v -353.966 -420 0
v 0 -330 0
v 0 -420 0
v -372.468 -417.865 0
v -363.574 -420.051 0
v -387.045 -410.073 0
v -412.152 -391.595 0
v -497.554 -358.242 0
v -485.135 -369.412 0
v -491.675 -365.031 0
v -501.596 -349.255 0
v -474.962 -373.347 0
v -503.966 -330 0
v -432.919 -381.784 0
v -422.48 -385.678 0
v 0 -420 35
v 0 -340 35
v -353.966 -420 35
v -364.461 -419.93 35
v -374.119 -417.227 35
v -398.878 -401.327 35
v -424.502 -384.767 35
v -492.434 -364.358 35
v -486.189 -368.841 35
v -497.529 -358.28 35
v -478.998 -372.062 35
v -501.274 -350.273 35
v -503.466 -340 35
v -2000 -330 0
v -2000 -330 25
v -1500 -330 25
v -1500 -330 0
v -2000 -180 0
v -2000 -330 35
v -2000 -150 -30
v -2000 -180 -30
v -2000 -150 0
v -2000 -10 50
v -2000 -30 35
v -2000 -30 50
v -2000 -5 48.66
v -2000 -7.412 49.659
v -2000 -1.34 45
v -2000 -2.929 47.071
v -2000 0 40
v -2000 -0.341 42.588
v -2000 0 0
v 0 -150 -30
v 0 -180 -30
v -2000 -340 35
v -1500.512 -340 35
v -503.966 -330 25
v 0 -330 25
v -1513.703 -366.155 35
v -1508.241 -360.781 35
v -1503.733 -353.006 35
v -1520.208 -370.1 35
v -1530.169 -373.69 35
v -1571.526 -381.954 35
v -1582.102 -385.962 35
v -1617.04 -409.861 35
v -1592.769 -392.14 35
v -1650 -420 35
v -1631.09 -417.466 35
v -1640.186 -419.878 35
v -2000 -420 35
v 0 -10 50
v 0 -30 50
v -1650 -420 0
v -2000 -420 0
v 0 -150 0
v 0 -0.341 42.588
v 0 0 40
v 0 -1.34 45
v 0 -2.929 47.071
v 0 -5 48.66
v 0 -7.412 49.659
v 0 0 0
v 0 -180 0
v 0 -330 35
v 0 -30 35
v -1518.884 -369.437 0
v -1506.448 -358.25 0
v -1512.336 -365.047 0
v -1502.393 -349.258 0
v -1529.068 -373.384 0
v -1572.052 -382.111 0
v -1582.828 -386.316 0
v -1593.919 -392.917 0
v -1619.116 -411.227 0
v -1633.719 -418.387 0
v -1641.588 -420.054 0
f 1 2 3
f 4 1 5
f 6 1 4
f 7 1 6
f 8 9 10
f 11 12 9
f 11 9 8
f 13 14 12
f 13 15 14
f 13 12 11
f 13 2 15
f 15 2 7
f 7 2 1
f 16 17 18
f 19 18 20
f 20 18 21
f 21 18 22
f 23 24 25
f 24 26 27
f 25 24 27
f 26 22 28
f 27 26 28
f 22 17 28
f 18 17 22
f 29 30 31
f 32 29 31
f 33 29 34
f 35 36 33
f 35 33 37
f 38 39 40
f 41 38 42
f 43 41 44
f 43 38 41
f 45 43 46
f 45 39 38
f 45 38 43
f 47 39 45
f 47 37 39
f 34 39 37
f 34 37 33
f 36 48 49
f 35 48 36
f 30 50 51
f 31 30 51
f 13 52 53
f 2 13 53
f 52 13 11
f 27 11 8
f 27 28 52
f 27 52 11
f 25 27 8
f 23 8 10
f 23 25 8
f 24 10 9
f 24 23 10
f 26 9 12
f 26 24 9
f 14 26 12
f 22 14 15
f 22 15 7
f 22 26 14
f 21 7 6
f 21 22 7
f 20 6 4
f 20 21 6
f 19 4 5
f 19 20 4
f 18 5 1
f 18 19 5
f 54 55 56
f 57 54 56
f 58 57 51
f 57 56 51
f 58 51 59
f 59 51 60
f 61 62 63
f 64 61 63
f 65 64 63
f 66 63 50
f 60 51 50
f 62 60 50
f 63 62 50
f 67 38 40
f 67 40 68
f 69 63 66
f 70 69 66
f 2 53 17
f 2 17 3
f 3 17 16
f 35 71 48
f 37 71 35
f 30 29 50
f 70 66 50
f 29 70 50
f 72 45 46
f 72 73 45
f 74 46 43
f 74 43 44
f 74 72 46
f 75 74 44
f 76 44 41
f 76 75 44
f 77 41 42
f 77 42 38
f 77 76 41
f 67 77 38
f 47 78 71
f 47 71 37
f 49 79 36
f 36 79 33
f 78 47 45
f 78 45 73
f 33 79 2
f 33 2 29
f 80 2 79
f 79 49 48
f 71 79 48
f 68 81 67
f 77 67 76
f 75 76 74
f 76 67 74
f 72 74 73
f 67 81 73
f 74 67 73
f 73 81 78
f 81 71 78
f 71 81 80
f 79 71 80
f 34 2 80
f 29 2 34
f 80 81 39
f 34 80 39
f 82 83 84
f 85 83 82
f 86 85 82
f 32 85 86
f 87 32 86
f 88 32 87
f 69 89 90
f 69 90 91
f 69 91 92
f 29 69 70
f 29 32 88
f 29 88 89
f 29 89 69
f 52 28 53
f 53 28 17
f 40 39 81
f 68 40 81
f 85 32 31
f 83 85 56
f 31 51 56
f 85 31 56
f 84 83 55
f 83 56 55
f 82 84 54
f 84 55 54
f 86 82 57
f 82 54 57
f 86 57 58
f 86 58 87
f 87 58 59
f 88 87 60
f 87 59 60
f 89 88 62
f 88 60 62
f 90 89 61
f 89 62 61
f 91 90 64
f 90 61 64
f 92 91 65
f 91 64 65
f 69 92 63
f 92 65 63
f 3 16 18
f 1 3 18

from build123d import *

# Parameters (mm, degrees)
SKETCH1_W             = 2000
SKETCH1_H             = 30
BOSS_EXTRUDE1_DEPTH   = 50
SKETCH2_W             = 2000
SKETCH2_H             = 300
BOSS_EXTRUDE2_DEPTH   = 35
FILLET1_R             = 10
BOSS_EXTRUDE3_DEPTH   = 35
BOSS_EXTRUDE3_2_DEPTH = 35
CHAMFER1_SIZE         = 10
CHAMFER2_SIZE         = 10
SKETCH6_W             = 2000
SKETCH6_H             = 30
BOSS_EXTRUDE4_DEPTH   = 30


with BuildPart() as part:
    # Sketch1 → Boss-Extrude1 (new body)
    with BuildSketch(Plane.XY):
        with Locations((-1000, -15)):
            Rectangle(SKETCH1_W, SKETCH1_H)
    extrude(amount=BOSS_EXTRUDE1_DEPTH)

    # Sketch2 → Boss-Extrude2 (add)
    with BuildSketch(Plane(origin=(0, 0, 0), x_dir=(-1, 0, 0), z_dir=(0, 0, -1))):
        with Locations((1000, -180)):
            Rectangle(SKETCH2_W, SKETCH2_H)
    extrude(amount=-BOSS_EXTRUDE2_DEPTH)

    # Fillet1
    fillet1_edges = [part.edges().sort_by_distance(p)[0] for p in [
        (-1000, 0, 50),
    ]]
    fillet(fillet1_edges, radius=FILLET1_R)

    # Sketch6 → Boss-Extrude4 (add)
    with BuildSketch(Plane(origin=(0, 0, 0), x_dir=(-1, 0, 0), z_dir=(0, 0, -1))):
        with Locations((1000, -165)):
            Rectangle(SKETCH6_W, SKETCH6_H)
    extrude(amount=BOSS_EXTRUDE4_DEPTH)


with BuildPart() as body_2:
    # Sketch3 → Boss-Extrude3 (new body)
    with BuildSketch(Plane.XY.offset(35)):
        with BuildLine():
            Line((-503.966493072, -330), (0, -330))
            Line((0, -330), (0, -420))
            Line((0, -420), (-353.966493072, -420))
            add(Edge.make_bspline(
                [(-503.966493072, -330), (-504.414495216, -385.6301706), (-422.344298333, -358.815027436), (-381.657255227, -423.699197751), (-353.966493072, -420)],
                knots=[0, 0, 0, 0, 0.572853035, 1, 1, 1, 1], degree=3))
        make_face()
    extrude(amount=-BOSS_EXTRUDE3_DEPTH)

    # Chamfer2
    chamfer2_edges = [body_2.edges().sort_by_distance(p)[0] for p in [
        (-251.983246536, -330, 35),
    ]]
    chamfer(chamfer2_edges, length=CHAMFER2_SIZE)


with BuildPart() as body_3:
    # Sketch3 → Boss-Extrude3 2 (new body)
    with BuildSketch(Plane.XY.offset(35)):
        with BuildLine():
            Line((-2000, -330), (-1500, -330))
            add(Edge.make_bspline(
                [(-1500, -330), (-1499.61965149, -385.542451224), (-1581.342955777, -359.113372387), (-1622.524460383, -423.231832414), (-1650, -420)],
                knots=[0, 0, 0, 0, 0.573311955, 1, 1, 1, 1], degree=3))
            Line((-1650, -420), (-2000, -420))
            Line((-2000, -420), (-2000, -330))
        make_face()
    extrude(amount=-BOSS_EXTRUDE3_2_DEPTH)

    # Chamfer1
    chamfer1_edges = [body_3.edges().sort_by_distance(p)[0] for p in [
        (-1750, -330, 35),
    ]]
    chamfer(chamfer1_edges, length=CHAMFER1_SIZE)


solid = Compound([part.part, body_2.part, body_3.part])
